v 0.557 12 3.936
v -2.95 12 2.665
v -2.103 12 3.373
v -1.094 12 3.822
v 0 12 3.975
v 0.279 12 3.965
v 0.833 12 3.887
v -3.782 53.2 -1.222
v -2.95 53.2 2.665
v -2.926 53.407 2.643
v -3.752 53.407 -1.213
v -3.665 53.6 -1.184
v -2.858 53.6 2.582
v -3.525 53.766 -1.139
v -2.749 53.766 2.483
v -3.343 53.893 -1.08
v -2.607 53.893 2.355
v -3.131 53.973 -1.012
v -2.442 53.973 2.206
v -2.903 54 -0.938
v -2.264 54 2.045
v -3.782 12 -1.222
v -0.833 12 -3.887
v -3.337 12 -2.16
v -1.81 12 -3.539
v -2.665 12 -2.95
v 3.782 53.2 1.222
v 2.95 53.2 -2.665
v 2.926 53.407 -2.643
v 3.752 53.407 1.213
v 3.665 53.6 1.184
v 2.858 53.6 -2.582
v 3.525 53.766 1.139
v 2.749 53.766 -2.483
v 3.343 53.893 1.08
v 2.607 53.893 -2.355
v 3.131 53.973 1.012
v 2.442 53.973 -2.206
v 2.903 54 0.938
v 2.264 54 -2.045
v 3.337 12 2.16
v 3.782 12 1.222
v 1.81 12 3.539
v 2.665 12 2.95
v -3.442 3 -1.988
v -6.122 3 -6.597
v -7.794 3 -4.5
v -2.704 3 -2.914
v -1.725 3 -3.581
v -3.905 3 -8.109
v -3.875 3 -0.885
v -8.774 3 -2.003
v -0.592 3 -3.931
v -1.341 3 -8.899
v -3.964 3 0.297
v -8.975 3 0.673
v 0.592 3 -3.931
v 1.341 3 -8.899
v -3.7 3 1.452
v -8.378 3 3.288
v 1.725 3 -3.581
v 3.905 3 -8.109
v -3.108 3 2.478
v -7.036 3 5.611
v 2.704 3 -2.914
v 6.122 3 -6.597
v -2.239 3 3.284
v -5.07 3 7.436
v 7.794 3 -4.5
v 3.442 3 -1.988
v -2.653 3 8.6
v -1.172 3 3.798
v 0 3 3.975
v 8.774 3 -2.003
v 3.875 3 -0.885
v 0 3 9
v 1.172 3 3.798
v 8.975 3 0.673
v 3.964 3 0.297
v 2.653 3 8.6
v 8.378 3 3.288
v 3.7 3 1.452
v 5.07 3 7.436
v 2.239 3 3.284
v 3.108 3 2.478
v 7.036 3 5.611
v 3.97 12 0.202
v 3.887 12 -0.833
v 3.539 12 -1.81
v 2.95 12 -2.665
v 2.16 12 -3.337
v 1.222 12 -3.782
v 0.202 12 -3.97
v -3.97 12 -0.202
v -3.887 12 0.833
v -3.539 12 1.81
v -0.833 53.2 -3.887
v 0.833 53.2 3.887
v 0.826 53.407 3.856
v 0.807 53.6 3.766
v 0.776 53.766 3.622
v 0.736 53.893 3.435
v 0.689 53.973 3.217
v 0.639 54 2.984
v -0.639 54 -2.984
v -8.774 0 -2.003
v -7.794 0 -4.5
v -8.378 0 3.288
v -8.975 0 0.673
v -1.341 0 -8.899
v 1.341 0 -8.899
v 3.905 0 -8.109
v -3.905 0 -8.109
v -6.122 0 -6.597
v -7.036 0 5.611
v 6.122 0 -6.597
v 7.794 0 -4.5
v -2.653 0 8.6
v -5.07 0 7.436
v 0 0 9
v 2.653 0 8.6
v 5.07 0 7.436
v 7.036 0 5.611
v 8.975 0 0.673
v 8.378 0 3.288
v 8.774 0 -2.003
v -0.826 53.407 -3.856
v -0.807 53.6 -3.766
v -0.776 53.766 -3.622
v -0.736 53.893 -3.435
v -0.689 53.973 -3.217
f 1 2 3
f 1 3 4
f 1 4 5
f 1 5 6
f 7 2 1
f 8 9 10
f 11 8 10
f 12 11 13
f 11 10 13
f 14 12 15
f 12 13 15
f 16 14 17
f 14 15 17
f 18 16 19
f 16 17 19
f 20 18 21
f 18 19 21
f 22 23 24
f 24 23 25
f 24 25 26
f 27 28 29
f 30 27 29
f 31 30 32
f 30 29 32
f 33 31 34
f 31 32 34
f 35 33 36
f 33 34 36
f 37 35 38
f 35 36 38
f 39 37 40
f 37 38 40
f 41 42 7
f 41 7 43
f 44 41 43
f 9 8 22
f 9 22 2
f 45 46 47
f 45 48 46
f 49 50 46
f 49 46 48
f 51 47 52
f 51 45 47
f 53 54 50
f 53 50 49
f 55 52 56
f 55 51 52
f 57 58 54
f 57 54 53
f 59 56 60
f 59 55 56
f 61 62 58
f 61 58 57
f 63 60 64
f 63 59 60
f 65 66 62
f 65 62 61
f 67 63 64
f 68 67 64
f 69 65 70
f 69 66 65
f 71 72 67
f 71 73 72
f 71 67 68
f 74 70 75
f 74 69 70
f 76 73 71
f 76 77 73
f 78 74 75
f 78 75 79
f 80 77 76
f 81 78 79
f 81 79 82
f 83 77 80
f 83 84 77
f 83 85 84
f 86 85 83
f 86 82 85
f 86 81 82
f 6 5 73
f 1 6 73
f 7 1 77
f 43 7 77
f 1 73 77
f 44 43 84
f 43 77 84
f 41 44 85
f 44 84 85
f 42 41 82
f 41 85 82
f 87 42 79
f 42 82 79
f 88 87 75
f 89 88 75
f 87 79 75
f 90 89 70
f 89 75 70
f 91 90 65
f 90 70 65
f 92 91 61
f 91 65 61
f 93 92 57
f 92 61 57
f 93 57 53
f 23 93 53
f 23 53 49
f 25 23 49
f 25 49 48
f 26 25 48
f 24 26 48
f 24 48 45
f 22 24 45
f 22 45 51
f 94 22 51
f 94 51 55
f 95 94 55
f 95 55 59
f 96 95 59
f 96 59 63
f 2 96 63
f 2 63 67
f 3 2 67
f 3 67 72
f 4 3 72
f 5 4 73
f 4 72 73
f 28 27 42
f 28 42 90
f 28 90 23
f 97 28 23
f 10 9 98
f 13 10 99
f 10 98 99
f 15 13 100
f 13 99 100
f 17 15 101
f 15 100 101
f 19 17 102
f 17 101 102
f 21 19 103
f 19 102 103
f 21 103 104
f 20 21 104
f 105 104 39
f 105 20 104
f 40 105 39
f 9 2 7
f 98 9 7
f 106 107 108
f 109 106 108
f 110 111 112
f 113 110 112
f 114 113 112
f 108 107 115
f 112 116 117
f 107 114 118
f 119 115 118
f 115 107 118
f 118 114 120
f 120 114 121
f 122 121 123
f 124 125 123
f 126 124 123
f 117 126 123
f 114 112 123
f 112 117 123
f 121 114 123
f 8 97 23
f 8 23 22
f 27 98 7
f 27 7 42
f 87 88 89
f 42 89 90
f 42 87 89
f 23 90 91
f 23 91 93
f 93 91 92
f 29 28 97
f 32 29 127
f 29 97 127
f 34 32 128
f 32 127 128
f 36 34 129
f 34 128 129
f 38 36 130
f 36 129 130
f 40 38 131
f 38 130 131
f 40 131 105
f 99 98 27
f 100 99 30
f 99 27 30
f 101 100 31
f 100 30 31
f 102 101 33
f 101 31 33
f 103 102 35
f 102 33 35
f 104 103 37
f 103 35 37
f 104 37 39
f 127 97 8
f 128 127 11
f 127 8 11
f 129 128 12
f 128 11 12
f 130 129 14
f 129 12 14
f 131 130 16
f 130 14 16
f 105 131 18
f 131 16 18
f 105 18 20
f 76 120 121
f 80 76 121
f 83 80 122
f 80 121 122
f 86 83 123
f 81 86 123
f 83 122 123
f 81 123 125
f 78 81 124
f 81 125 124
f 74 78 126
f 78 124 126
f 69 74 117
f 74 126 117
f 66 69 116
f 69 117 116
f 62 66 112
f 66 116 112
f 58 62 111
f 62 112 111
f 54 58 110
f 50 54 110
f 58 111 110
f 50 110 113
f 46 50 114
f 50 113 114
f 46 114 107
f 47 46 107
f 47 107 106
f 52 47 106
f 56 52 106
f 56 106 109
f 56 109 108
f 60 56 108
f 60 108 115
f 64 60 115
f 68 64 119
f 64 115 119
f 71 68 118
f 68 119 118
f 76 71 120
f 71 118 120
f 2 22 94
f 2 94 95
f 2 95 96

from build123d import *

# Parameters (mm, degrees)
CROQUIS1_R              = 9
SALIENTE_EXTRUIR1_DEPTH = 3
CROQUIS2_R              = 3.975
SALIENTE_EXTRUIR2_DEPTH = 9
SALIENTE_EXTRUIR3_DEPTH = 42
REDONDEO1_R             = 0.8


with BuildPart() as part:
    # Croquis1 → Saliente-Extruir1 (new body)
    with BuildSketch(Plane(origin=(0, 0, 0), x_dir=(1, 0, 0), z_dir=(0, 1, 0))):
        with Locations(Location((0, 0, 0), (0, 0, 270))):
            Circle(CROQUIS1_R)
    extrude(amount=SALIENTE_EXTRUIR1_DEPTH)

    # Croquis2 → Saliente-Extruir2 (add)
    with BuildSketch(Plane(origin=(0, 3, 0), x_dir=(1, 0, 0), z_dir=(0, 1, 0))):
        with Locations(Location((0, 0, 0), (0, 0, 270))):
            Circle(CROQUIS2_R)
    extrude(amount=SALIENTE_EXTRUIR2_DEPTH)

    # Croquis3 → Saliente-Extruir3 (add)
    with BuildSketch(Plane(origin=(0, 12, 0), x_dir=(1, 0, 0), z_dir=(0, 1, 0))):
        Polygon((-2.949727384, -2.664532485), (0.832689129, -3.886805091), (3.782416513, -1.222272606), (2.949727384, 2.664532485), (-0.832689129, 3.886805091), (-3.782416513, 1.222272606), align=None)
    extrude(amount=SALIENTE_EXTRUIR3_DEPTH)

    # Redondeo1
    redondeo1_edges = [part.edges().sort_by_distance(p)[0] for p in [
        (-1.058519127, 54, 3.275668788),
        (2.307552821, 54, 2.554538849),
        (3.366071948, 54, -0.721129939),
        (1.058519127, 54, -3.275668788),
        (-2.307552821, 54, -2.554538849),
        (-3.366071948, 54, 0.721129939),
    ]]
    fillet(redondeo1_edges, radius=REDONDEO1_R)


solid = part.part
